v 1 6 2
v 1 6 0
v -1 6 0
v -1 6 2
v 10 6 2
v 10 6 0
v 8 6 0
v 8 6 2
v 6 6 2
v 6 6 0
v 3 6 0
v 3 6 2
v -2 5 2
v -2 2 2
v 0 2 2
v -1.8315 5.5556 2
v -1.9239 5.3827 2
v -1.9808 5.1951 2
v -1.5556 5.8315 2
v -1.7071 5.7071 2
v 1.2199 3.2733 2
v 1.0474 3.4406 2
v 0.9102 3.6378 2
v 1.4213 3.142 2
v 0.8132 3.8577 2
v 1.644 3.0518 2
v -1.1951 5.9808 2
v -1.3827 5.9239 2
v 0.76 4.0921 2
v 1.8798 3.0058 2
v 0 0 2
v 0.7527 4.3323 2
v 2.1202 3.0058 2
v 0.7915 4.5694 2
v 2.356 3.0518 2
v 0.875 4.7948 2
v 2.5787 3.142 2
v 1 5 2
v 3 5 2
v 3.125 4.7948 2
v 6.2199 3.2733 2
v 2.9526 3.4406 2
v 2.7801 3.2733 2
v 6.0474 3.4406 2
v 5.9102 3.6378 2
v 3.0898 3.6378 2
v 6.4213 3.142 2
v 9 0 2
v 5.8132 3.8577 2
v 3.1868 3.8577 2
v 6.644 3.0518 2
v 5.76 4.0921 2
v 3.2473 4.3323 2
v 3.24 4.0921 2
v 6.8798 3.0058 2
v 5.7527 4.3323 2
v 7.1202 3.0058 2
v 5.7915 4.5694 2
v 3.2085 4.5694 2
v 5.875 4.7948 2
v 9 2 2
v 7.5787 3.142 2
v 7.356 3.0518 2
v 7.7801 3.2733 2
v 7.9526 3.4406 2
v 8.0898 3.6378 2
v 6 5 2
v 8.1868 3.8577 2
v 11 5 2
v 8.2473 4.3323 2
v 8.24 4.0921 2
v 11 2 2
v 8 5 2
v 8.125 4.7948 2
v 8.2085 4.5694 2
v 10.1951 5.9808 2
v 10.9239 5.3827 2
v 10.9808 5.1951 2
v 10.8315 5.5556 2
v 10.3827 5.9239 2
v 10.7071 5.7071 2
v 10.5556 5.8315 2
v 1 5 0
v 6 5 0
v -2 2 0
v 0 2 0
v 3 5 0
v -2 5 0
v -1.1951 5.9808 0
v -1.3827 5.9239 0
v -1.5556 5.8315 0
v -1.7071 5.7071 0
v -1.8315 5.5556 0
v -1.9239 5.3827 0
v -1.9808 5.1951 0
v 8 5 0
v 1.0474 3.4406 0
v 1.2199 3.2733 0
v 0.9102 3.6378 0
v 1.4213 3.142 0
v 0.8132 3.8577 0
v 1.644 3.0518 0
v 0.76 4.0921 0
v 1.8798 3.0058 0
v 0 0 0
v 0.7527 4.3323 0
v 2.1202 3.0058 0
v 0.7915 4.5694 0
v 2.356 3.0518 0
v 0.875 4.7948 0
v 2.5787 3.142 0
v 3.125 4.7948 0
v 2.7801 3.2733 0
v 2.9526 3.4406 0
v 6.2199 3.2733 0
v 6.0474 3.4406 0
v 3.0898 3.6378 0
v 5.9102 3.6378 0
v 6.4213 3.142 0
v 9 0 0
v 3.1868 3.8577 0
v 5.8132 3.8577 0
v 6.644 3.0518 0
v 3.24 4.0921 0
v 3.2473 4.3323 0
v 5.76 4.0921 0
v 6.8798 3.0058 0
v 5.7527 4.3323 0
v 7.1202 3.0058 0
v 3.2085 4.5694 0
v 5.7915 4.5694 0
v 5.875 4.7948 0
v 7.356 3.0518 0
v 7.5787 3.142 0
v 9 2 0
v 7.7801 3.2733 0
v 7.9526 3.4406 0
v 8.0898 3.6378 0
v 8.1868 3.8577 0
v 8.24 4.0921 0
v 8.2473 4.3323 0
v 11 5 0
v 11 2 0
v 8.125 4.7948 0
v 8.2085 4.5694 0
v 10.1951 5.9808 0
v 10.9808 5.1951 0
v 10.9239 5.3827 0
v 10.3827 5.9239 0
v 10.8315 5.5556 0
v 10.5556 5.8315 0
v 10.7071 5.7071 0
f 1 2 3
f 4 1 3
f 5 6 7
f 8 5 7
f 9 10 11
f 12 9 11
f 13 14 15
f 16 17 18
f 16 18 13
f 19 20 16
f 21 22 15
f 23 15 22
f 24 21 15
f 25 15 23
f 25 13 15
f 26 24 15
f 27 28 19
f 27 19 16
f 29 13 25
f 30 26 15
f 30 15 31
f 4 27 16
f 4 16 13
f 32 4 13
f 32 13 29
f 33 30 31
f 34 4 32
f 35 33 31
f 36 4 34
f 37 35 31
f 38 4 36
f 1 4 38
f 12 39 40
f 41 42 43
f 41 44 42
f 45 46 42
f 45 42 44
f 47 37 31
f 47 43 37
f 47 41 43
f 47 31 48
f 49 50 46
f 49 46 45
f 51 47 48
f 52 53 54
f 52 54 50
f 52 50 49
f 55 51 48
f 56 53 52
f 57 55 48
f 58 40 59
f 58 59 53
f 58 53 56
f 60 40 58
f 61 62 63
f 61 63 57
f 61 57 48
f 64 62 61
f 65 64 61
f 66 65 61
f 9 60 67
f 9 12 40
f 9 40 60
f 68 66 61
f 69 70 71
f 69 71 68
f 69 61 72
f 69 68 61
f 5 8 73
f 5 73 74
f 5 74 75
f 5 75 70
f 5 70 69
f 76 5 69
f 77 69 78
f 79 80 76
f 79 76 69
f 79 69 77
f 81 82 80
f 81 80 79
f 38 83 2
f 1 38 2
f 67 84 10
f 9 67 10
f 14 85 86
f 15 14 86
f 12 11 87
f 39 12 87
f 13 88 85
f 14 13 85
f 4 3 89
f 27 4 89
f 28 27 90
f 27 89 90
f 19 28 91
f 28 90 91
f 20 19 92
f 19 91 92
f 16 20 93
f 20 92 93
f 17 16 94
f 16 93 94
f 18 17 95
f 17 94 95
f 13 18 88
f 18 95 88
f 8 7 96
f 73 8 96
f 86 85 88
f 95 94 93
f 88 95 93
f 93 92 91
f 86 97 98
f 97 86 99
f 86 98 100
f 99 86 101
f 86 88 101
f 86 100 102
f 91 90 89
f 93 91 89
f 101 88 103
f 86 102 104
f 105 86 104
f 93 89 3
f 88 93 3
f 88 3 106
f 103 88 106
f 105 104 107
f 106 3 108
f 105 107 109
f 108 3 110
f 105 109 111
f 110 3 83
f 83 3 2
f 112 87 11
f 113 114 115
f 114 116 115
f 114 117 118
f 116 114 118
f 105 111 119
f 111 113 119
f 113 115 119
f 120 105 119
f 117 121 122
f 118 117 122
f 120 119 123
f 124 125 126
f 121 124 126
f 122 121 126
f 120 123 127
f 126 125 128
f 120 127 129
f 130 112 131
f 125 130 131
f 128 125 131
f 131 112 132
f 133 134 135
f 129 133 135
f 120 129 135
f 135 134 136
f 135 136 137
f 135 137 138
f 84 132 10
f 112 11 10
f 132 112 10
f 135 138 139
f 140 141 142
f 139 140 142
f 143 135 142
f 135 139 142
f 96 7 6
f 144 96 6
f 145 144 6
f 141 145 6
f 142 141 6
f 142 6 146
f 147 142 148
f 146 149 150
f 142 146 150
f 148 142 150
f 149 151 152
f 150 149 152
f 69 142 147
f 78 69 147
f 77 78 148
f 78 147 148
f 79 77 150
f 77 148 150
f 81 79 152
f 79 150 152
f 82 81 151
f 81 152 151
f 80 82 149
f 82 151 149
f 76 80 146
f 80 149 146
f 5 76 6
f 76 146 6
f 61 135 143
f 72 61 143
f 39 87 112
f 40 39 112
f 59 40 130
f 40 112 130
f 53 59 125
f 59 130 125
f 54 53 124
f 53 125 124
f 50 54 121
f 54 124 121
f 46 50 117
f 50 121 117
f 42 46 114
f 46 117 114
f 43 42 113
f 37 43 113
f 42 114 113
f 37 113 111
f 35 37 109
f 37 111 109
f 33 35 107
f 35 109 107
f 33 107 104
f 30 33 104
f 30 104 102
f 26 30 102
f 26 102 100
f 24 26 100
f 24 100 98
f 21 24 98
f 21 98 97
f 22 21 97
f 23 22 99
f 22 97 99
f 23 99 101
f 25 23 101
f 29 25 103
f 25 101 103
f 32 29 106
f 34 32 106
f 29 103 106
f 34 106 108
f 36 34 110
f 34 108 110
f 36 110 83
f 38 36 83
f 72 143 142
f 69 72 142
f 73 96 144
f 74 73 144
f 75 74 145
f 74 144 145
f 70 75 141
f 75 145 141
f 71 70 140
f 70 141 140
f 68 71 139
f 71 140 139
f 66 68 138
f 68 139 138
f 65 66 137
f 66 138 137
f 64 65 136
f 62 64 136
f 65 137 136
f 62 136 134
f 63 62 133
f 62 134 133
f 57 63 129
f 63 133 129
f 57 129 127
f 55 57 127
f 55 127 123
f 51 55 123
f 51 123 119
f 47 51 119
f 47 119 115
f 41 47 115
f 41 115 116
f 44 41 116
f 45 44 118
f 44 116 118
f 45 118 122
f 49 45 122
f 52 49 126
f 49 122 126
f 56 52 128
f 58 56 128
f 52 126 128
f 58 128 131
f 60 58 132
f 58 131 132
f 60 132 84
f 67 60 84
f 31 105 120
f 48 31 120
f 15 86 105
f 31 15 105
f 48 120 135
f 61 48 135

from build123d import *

# Parameters (mm, degrees)
BOSS_EXTRUDE1_DEPTH = 2


with BuildPart() as part:
    # Model → Boss-Extrude1 (new body)
    with BuildSketch(Plane.XY):
        with BuildLine():
            Line((11, 2), (11, 5))
            ThreePointArc((11, 5), (10.707106781, 5.707106781), (10, 6))
            Line((10, 6), (8, 6))
            Line((8, 6), (8, 5))
            ThreePointArc((8, 5), (7, 3), (6, 5))
            Line((6, 5), (6, 6))
            Line((6, 6), (3, 6))
            Line((3, 6), (3, 5))
            ThreePointArc((3, 5), (2, 3), (1, 5))
            Line((1, 5), (1, 6))
            Line((1, 6), (-1, 6))
            ThreePointArc((-1, 6), (-1.707106781, 5.707106781), (-2, 5))
            Line((-2, 5), (-2, 2))
            Line((-2, 2), (0, 2))
            Line((0, 2), (0, 0))
            Line((0, 0), (9, 0))
            Line((9, 0), (9, 2))
            Line((9, 2), (11, 2))
        make_face()
    extrude(amount=BOSS_EXTRUDE1_DEPTH)


solid = part.part
